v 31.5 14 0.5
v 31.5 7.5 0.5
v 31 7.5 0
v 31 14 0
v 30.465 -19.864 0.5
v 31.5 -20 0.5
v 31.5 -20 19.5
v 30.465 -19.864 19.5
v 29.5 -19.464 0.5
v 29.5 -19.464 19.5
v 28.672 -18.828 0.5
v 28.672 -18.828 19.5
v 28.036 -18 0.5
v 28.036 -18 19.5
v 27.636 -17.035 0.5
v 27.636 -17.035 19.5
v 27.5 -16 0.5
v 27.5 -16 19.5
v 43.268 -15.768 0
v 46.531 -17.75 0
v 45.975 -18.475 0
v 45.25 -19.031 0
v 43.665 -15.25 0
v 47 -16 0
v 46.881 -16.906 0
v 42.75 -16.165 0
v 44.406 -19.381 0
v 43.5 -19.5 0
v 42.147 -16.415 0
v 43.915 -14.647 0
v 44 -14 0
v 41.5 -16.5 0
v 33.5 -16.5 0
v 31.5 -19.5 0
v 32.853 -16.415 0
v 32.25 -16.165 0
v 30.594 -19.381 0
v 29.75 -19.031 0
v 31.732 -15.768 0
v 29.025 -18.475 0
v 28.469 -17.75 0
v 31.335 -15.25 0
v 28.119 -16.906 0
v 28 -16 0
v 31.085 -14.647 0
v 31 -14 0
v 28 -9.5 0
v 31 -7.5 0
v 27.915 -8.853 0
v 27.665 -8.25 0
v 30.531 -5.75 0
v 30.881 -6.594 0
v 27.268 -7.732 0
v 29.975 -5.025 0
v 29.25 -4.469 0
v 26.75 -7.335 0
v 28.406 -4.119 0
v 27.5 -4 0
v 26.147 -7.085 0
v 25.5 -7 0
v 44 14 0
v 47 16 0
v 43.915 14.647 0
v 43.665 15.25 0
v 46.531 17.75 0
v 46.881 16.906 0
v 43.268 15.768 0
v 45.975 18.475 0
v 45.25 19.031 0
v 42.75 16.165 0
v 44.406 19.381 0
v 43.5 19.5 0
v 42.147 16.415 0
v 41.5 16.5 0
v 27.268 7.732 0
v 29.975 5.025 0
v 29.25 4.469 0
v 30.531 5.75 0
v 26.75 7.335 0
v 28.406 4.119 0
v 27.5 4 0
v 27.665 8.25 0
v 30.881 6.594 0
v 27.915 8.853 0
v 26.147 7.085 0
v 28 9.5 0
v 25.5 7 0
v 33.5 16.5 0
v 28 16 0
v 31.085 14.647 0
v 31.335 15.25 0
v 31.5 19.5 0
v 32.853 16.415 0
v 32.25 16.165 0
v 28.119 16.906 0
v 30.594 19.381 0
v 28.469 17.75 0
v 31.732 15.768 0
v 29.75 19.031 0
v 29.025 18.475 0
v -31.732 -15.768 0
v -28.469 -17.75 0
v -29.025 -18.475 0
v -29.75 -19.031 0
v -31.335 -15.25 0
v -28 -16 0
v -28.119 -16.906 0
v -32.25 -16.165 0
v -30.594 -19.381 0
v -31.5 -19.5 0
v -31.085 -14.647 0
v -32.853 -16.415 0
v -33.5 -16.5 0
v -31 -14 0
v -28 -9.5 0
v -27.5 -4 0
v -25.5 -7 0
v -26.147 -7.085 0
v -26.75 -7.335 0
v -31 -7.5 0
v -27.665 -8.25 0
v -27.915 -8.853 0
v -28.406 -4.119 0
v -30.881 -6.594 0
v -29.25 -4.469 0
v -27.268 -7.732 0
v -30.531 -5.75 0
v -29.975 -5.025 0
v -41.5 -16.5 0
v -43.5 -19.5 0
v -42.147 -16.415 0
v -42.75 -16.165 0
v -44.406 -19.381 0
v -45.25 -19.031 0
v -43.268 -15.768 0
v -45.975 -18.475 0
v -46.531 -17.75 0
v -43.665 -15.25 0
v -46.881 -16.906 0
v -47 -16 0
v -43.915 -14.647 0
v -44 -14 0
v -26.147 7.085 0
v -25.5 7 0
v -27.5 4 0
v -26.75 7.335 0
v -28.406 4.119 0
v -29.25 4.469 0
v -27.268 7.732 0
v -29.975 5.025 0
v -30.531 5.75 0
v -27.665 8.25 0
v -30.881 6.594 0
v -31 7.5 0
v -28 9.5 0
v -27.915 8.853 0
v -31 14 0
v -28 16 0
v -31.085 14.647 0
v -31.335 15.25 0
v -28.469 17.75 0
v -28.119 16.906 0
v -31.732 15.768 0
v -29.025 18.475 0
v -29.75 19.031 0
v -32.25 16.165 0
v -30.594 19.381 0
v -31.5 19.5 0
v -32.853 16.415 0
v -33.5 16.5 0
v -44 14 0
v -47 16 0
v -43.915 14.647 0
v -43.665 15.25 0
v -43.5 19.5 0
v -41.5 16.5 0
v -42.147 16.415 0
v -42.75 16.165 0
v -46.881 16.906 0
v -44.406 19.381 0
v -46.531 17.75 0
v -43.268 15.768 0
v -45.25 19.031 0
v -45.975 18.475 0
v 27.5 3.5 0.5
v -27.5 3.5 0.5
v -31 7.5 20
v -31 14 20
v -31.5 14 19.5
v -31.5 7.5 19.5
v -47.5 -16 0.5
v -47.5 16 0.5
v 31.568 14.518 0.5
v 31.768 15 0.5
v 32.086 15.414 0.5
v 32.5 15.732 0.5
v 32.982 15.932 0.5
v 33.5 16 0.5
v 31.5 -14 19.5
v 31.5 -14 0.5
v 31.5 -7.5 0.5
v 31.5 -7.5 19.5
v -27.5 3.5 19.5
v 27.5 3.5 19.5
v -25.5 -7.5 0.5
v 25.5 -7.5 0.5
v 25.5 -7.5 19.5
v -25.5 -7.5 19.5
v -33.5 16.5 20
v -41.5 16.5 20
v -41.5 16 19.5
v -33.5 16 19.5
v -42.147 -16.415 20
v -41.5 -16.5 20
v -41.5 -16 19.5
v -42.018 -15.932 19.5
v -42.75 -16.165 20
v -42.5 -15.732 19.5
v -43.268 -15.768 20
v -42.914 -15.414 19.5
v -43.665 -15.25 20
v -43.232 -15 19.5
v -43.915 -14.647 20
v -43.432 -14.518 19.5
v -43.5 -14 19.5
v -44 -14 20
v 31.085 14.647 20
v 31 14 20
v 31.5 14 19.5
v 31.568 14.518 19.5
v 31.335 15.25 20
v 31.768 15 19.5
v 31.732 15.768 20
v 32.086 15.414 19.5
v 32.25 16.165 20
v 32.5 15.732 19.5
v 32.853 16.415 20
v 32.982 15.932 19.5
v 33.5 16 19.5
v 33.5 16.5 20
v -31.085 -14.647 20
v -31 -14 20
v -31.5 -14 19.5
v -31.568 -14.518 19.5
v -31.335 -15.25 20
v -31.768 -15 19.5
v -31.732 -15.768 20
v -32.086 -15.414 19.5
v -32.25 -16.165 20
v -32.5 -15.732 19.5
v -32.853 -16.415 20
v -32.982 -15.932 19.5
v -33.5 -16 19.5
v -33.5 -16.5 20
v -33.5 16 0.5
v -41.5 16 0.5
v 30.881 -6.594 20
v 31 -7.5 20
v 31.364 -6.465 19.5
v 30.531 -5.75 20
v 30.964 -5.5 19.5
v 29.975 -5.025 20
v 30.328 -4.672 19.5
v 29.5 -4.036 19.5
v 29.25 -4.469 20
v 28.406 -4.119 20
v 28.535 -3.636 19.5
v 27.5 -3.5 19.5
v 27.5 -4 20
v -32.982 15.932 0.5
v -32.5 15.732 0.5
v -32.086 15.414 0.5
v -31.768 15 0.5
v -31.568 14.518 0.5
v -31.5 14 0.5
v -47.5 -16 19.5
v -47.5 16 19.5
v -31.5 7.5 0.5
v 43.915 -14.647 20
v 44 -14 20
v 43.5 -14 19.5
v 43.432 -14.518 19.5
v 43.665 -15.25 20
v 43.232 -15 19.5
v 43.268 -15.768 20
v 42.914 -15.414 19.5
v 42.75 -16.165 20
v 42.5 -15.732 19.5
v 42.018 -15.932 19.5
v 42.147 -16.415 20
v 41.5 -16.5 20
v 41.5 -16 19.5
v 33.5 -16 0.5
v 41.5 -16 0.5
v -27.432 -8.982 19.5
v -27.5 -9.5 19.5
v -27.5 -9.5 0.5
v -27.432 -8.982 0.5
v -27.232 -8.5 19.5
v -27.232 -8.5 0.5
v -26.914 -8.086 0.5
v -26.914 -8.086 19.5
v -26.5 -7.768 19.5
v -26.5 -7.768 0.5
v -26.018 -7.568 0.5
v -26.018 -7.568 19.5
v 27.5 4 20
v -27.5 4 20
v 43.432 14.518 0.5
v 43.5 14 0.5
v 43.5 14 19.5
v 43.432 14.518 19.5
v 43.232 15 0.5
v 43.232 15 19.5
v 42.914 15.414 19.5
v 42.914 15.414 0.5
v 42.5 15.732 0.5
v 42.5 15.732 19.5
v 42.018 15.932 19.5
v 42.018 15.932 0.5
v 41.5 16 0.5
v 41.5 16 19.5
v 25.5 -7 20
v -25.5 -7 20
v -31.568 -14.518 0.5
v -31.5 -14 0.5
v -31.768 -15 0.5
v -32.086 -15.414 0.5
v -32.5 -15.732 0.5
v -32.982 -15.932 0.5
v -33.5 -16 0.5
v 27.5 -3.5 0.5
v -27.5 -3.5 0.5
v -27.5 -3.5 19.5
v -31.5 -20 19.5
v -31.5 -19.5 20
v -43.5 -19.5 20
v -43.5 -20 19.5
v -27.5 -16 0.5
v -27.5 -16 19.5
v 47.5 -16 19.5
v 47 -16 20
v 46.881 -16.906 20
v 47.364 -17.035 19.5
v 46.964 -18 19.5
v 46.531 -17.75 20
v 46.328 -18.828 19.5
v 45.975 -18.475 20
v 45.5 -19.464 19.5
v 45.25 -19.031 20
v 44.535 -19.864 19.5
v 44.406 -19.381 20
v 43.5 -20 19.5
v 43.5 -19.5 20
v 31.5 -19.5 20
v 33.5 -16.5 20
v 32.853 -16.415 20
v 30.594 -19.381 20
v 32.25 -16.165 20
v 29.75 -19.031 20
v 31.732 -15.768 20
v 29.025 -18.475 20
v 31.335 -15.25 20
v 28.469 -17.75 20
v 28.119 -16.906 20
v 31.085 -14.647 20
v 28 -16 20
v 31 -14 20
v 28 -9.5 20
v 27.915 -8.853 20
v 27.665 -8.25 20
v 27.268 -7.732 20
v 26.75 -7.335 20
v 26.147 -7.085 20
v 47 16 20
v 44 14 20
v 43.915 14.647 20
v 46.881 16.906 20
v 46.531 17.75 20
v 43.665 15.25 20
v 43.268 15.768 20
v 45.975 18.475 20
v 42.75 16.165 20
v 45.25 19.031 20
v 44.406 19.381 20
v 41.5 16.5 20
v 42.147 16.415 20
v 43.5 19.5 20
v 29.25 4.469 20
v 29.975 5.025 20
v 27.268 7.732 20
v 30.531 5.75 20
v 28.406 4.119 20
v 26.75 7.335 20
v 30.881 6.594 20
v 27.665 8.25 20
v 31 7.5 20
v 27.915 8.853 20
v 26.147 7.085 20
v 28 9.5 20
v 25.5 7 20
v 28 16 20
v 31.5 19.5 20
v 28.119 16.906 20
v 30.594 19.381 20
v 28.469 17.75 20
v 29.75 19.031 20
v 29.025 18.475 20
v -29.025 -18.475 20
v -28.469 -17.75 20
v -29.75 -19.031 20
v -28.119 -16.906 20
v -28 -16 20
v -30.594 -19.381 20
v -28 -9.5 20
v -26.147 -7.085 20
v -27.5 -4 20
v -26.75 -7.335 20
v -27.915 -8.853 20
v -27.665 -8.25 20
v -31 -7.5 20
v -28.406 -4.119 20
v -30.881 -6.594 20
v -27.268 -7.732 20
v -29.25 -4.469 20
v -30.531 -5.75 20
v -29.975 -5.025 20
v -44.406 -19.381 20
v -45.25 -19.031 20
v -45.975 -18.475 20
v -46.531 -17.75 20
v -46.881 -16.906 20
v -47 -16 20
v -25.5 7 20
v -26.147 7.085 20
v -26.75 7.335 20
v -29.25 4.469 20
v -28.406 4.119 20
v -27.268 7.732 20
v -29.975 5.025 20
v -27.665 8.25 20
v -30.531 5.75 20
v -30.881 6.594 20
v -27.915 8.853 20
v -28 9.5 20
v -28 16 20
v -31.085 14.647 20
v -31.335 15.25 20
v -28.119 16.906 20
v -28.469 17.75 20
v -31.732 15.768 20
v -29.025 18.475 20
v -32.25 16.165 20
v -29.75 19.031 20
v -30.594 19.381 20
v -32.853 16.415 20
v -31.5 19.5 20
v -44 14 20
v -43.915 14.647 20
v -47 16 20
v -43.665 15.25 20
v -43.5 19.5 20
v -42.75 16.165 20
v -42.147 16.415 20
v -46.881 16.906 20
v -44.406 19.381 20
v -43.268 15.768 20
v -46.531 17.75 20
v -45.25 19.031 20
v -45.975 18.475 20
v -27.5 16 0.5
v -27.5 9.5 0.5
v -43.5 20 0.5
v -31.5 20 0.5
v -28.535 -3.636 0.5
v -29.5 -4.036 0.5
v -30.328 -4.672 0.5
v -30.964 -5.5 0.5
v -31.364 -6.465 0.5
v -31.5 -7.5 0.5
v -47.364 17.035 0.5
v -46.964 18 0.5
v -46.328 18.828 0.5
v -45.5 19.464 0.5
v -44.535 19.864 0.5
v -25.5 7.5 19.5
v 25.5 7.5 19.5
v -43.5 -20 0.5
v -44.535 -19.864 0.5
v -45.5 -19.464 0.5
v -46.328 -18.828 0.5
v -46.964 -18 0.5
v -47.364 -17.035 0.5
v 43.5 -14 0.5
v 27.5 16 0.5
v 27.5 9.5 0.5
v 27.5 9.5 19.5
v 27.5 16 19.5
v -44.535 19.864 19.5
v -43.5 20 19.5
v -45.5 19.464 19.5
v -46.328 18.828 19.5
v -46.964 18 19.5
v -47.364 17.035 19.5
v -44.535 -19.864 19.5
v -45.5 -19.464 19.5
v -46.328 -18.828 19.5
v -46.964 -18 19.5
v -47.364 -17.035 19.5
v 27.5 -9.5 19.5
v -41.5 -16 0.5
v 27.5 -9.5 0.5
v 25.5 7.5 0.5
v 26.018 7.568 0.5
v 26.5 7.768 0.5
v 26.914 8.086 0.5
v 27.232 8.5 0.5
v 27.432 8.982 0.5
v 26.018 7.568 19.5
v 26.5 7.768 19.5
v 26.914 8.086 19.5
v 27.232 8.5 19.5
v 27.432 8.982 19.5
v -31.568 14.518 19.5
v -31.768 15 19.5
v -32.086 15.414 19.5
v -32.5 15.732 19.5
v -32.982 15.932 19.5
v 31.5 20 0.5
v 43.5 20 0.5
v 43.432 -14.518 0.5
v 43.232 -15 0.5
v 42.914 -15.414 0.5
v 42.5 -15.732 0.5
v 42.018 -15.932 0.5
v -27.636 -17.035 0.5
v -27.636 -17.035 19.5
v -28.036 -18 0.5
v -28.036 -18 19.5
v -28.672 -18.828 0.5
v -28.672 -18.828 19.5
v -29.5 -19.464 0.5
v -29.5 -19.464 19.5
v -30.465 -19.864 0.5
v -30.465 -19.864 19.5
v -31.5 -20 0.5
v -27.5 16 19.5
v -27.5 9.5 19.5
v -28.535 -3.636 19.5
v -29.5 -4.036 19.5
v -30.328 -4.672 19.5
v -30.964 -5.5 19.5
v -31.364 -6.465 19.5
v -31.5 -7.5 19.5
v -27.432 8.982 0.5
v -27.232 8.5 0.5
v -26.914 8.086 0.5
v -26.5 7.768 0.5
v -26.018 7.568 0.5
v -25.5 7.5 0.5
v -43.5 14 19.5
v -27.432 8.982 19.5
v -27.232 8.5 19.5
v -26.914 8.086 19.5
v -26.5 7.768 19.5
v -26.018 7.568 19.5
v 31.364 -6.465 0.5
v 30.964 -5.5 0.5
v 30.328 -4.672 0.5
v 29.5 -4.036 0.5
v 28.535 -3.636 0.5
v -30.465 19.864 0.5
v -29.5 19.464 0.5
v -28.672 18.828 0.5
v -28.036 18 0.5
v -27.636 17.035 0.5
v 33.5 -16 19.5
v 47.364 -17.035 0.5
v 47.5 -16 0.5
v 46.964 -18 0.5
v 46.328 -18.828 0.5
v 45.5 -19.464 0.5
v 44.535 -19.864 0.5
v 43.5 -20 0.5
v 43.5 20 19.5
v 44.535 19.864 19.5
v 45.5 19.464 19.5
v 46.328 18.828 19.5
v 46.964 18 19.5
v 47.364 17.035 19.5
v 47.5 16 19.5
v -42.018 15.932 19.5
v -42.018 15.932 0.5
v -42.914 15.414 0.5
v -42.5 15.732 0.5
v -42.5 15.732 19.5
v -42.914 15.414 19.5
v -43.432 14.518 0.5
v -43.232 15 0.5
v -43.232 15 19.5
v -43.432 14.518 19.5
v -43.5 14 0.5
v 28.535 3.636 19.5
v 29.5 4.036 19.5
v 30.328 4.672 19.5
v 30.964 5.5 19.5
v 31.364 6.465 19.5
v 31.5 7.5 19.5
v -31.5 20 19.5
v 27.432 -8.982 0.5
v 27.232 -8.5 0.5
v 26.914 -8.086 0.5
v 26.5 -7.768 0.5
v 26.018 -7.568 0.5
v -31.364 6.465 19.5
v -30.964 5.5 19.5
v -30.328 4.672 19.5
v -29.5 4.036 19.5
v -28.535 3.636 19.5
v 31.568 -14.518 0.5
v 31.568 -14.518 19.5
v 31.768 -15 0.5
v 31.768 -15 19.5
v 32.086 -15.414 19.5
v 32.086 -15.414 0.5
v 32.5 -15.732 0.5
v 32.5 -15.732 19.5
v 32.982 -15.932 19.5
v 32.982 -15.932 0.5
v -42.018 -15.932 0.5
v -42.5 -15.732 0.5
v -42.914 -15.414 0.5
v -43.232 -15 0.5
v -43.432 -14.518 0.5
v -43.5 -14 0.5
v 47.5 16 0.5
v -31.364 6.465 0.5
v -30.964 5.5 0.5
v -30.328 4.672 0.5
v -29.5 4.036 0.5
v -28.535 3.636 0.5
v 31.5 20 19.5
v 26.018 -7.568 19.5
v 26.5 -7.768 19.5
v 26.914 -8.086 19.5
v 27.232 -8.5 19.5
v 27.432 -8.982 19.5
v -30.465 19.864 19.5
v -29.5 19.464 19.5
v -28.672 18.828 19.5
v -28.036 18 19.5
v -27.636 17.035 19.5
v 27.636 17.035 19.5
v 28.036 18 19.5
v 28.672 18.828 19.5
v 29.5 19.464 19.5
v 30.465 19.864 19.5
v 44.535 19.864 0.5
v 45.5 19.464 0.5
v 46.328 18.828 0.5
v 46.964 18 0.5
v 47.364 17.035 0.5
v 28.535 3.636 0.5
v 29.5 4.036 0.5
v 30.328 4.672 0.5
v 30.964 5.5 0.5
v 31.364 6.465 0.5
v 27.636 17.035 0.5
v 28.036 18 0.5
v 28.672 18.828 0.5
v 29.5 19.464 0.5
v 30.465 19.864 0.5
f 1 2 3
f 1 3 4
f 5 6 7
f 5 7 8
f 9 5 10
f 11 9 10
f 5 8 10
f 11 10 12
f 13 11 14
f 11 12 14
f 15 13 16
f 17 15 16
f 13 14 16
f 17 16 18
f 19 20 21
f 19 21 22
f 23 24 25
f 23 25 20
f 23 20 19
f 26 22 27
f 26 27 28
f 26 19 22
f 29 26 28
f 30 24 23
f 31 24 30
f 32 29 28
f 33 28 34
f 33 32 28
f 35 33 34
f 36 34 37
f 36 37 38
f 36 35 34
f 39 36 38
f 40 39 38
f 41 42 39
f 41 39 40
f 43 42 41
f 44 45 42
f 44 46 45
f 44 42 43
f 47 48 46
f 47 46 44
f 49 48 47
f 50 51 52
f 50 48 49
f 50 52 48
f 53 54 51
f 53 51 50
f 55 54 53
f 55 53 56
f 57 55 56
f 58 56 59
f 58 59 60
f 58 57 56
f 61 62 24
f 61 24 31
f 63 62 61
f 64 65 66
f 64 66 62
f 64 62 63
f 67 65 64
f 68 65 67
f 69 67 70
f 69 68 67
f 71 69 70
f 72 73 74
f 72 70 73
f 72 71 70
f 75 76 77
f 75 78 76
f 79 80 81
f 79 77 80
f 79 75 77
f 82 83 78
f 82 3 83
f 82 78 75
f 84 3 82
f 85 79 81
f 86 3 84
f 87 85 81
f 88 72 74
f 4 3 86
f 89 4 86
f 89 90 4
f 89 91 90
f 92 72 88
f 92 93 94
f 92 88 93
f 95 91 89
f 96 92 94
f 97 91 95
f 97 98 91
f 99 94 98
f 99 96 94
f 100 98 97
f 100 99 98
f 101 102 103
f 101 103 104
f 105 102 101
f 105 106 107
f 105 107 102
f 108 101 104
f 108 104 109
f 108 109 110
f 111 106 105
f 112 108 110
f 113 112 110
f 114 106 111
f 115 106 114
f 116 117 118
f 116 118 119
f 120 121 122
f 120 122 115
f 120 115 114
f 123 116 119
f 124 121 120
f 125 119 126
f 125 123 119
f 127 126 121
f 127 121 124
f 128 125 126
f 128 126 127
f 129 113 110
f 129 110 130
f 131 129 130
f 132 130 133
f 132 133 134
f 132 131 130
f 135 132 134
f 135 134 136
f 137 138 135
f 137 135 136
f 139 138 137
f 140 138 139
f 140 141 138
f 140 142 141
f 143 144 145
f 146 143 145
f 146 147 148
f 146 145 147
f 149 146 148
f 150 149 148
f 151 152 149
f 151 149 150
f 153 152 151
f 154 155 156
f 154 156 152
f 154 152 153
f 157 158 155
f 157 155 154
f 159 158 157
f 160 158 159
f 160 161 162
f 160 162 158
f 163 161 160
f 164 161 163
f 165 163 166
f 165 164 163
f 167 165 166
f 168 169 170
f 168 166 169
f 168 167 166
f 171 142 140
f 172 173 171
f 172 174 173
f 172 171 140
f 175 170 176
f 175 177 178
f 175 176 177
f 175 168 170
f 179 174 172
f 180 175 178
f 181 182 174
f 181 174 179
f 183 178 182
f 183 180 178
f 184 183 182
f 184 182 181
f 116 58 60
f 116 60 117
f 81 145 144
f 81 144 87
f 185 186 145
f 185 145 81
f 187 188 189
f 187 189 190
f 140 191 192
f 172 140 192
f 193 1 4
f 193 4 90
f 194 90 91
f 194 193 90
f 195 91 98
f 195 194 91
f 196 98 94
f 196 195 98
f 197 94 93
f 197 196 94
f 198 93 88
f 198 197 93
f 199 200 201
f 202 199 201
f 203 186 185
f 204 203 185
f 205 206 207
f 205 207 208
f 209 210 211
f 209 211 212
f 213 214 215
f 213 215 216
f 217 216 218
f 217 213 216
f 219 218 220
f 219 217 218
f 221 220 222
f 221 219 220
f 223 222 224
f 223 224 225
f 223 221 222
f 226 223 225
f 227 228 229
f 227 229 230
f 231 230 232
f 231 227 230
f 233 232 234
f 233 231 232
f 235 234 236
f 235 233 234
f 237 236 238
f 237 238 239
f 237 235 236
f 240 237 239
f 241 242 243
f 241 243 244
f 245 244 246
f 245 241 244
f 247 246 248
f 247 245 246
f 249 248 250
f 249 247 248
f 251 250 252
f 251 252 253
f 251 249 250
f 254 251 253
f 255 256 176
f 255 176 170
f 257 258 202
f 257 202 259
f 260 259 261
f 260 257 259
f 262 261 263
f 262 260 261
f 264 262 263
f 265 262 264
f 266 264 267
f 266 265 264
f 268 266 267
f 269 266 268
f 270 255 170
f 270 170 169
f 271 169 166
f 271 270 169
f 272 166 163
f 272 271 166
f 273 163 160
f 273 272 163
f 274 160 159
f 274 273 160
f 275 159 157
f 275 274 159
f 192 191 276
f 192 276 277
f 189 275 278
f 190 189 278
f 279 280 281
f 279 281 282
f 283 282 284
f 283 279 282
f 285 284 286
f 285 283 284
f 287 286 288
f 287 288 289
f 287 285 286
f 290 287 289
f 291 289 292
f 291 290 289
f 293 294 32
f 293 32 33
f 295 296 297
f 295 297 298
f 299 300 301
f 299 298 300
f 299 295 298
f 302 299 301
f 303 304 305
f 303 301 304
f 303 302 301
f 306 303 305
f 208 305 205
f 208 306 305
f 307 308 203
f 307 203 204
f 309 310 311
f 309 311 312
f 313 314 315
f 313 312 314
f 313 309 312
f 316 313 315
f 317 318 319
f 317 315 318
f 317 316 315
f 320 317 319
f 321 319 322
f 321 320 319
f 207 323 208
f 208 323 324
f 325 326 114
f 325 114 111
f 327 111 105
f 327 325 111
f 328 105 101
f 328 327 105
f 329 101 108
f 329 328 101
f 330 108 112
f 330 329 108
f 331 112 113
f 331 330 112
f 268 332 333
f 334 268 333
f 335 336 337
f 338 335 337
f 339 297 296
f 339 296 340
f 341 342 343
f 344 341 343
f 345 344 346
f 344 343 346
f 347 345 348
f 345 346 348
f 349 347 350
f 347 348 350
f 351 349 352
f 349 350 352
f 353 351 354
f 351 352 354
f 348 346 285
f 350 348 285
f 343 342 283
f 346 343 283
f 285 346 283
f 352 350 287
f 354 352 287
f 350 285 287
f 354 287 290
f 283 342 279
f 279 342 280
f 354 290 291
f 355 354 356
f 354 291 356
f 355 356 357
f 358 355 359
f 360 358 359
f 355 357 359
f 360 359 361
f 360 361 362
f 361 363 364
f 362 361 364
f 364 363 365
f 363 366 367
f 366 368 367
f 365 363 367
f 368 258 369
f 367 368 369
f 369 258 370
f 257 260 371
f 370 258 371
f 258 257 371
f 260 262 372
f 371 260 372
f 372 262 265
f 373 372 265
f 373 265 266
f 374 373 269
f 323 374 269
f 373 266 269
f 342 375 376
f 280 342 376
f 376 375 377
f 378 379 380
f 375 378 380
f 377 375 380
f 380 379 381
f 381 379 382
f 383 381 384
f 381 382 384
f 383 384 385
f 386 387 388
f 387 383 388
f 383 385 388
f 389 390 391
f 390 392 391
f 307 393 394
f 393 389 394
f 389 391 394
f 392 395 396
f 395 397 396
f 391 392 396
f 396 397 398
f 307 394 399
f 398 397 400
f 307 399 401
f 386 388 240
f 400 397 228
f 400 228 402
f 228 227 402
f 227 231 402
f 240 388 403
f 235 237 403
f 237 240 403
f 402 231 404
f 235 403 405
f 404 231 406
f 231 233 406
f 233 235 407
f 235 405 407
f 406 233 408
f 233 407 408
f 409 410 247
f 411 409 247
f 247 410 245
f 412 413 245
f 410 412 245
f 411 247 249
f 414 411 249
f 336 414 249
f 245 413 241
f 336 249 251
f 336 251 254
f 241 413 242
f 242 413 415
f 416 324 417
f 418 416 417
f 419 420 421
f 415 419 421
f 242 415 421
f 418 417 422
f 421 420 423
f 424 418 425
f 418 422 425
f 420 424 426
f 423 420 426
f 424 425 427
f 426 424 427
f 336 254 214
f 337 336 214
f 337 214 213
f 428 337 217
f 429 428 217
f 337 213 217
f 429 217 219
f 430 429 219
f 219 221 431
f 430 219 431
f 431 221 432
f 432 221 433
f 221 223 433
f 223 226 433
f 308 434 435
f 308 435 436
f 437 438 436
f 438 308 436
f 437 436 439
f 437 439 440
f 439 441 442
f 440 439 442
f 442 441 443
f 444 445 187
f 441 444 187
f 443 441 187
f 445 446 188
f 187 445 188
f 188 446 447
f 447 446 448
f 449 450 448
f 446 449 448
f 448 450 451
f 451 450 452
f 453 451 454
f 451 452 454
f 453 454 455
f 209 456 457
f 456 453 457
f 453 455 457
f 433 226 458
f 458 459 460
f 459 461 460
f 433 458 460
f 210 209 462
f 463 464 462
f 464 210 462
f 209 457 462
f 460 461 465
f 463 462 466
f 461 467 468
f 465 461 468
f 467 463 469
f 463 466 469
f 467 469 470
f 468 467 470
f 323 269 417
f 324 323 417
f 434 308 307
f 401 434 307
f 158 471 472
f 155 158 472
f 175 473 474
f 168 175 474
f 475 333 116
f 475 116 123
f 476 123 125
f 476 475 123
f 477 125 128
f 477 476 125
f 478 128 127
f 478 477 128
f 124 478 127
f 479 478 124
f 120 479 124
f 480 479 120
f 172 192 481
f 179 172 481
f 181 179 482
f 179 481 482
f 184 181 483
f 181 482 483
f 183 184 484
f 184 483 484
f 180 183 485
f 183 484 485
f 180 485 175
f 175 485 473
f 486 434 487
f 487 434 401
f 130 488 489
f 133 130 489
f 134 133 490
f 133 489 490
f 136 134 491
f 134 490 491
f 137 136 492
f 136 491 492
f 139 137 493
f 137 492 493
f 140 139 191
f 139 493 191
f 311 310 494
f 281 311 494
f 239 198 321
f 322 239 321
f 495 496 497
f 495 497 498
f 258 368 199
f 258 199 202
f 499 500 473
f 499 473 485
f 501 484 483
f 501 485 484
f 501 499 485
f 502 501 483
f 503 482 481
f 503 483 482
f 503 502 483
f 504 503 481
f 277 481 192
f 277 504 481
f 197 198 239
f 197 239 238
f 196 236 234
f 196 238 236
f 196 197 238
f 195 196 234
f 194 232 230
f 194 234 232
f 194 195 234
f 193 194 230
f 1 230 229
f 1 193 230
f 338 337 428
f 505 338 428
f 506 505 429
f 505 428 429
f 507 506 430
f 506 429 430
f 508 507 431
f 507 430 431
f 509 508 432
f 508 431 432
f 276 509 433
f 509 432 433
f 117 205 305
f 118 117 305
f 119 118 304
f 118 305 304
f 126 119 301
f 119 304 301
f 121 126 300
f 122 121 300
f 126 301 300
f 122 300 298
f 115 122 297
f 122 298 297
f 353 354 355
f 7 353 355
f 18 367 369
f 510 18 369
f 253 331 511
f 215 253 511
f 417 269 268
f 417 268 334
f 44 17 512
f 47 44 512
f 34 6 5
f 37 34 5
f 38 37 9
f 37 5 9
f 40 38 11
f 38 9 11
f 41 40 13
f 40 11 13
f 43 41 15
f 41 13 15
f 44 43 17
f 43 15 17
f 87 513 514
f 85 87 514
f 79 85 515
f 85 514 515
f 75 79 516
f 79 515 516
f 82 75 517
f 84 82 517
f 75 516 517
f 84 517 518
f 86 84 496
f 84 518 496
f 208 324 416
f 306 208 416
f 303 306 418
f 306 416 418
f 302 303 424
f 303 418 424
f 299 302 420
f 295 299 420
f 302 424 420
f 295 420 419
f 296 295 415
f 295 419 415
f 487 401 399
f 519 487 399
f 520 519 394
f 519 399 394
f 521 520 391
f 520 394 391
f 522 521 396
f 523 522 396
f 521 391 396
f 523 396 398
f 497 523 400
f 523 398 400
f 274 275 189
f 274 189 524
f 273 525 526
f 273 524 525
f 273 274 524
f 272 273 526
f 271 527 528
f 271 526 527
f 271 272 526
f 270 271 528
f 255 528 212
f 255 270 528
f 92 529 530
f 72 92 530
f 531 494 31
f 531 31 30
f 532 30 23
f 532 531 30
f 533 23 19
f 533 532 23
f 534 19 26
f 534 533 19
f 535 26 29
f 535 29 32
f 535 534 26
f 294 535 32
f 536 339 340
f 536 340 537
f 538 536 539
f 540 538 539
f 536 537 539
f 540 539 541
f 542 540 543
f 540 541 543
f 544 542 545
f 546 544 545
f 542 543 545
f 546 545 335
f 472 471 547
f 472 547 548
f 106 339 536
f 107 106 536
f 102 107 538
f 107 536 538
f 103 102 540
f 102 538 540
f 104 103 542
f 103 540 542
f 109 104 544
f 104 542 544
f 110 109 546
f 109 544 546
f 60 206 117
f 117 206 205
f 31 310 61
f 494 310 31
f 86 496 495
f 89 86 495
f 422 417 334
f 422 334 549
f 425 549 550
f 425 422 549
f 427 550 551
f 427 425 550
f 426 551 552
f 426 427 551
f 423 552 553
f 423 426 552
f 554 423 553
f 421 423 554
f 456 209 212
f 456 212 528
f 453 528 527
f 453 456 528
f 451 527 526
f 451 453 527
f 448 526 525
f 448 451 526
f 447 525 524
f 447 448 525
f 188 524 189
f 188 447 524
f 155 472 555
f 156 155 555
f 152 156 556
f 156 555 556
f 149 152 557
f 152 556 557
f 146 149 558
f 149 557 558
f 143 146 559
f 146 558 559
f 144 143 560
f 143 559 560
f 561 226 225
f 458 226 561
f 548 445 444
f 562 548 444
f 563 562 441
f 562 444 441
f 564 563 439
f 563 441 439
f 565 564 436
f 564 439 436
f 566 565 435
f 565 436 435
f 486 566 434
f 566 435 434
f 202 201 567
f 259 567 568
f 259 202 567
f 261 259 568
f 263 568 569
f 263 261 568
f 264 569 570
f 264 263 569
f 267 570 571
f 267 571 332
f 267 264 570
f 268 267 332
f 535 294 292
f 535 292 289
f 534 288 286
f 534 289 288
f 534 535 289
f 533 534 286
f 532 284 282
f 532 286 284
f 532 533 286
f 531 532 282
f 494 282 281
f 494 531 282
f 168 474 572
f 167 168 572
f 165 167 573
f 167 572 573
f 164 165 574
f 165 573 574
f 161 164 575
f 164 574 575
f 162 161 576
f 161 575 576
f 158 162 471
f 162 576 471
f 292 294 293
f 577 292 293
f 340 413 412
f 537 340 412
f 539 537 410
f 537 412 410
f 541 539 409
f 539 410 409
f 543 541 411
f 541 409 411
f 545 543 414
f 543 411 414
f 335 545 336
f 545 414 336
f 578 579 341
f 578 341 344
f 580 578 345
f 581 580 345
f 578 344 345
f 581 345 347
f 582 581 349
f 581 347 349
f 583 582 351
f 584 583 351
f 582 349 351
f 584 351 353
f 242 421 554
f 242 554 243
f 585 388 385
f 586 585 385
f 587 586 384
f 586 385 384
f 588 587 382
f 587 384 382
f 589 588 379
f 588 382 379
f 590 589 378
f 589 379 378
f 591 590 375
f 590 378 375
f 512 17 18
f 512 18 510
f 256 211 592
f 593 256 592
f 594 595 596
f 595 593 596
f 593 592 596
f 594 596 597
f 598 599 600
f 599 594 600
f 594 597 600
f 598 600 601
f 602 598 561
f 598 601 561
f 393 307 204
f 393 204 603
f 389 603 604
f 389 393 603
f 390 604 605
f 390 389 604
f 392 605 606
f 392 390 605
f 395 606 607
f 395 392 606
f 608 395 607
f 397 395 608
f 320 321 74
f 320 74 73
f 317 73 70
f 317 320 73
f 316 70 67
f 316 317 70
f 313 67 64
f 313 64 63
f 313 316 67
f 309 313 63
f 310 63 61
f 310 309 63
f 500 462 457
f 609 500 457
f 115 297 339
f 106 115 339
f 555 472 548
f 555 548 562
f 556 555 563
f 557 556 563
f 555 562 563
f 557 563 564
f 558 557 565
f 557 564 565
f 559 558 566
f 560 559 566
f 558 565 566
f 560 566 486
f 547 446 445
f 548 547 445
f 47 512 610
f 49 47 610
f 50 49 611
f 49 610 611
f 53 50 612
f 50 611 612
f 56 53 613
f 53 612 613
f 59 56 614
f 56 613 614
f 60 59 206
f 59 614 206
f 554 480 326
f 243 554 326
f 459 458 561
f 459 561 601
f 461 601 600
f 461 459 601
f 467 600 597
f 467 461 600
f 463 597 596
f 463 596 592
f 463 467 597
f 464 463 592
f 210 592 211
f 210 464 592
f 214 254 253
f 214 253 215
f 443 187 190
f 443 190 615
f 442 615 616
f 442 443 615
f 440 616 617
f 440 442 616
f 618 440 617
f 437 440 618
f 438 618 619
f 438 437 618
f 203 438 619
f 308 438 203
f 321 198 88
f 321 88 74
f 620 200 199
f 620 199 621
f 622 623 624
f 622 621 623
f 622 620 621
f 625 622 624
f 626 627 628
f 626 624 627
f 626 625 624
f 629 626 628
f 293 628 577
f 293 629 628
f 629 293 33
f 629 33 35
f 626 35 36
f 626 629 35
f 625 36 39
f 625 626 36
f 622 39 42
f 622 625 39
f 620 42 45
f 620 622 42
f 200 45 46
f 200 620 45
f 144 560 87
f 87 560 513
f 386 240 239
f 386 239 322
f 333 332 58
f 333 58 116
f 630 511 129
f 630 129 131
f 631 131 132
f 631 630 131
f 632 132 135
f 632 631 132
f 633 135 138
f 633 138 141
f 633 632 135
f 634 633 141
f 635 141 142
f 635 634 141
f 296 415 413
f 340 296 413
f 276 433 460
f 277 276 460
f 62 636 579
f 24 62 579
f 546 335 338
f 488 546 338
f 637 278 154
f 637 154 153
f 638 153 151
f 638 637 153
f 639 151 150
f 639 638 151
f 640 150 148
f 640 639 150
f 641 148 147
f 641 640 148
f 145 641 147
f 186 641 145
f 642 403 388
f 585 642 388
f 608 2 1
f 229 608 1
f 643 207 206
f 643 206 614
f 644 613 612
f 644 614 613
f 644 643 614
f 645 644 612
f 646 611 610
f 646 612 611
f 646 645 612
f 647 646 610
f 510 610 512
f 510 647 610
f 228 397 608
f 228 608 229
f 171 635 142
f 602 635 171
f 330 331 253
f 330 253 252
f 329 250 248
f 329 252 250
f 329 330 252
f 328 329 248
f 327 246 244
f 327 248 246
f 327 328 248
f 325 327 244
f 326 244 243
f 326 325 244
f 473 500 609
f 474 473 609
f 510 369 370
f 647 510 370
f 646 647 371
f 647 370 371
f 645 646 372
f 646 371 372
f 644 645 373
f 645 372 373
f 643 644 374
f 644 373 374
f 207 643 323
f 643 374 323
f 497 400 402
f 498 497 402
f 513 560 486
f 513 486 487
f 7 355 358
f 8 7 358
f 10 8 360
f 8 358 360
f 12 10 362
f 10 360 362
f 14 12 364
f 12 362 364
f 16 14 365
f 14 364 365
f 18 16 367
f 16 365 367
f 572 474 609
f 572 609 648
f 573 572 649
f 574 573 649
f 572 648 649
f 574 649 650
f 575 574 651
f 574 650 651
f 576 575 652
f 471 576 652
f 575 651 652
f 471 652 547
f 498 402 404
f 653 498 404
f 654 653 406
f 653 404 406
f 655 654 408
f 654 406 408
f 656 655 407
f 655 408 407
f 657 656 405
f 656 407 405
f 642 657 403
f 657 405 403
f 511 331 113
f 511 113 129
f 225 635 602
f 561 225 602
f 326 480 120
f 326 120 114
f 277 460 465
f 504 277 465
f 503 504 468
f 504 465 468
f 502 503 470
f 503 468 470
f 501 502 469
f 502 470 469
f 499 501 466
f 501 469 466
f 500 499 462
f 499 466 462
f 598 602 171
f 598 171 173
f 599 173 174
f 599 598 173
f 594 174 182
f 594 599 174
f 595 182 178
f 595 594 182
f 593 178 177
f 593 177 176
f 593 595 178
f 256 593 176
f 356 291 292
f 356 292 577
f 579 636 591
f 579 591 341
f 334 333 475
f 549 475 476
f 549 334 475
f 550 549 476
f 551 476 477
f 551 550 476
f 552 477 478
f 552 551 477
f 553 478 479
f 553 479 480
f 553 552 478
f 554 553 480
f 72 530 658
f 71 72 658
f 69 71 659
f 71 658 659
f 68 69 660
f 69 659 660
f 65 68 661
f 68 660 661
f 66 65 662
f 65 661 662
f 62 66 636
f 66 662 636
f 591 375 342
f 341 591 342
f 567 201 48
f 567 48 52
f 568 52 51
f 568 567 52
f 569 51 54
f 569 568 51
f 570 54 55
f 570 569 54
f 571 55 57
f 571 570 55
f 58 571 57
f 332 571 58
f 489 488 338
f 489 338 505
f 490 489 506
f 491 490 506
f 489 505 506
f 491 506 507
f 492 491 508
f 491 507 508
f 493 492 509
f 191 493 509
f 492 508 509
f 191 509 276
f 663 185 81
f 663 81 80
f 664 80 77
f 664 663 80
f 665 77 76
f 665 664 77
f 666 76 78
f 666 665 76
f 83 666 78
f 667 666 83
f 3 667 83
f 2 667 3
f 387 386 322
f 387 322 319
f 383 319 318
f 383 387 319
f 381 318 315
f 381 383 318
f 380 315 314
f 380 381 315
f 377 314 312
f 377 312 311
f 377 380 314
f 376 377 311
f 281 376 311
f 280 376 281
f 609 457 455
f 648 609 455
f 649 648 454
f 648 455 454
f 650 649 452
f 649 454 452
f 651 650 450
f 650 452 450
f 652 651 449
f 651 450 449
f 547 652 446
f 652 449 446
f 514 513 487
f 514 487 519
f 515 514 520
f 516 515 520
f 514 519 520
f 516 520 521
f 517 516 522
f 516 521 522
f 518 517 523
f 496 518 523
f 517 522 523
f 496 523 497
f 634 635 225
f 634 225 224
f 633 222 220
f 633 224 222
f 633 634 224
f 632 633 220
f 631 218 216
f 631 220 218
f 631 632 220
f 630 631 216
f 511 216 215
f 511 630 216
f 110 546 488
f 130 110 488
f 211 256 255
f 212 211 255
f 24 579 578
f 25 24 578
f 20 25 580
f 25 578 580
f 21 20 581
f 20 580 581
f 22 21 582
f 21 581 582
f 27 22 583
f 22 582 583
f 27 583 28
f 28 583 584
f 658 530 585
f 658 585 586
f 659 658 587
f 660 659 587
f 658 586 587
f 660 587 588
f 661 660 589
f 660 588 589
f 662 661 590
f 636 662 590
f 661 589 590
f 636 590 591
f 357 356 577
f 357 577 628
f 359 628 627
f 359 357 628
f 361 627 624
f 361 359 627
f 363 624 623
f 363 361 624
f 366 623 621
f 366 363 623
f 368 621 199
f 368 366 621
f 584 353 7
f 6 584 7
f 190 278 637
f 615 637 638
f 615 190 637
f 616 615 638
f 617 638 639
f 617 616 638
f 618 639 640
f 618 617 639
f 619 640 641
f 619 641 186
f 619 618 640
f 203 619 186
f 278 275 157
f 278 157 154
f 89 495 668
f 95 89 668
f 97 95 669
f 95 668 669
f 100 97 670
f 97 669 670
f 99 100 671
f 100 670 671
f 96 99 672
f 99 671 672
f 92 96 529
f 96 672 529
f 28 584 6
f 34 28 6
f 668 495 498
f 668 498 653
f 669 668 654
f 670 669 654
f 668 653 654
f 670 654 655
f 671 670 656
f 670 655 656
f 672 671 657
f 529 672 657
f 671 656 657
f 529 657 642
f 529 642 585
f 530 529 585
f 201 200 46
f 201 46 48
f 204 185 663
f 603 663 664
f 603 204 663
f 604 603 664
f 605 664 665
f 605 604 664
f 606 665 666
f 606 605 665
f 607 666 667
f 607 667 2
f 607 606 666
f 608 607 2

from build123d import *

# Parameters (mm, degrees)
PAD_DEPTH    = 20
THICKNESS_T  = -4
FILLET_R     = 4
FILLET001_R  = 2
CHAMFER_SIZE = 0.5


with BuildPart() as part:
    # Sketch → Pad (new body)
    with BuildSketch(Plane.XY):
        Polygon((-47.5, 20), (-27.5, 20), (-27.5, 7.5), (27.5, 7.5), (27.5, 20), (47.5, 20), (47.5, -20), (27.5, -20), (27.5, -7.5), (-27.5, -7.5), (-27.5, -20), (-47.5, -20), align=None)
    extrude(amount=PAD_DEPTH)

    # Thickness
    thickness_openings = [part.faces().sort_by_distance(p)[0] for p in [
        (0, 0, 0),
        (0, 0, 20),
    ]]
    offset(amount=THICKNESS_T, openings=thickness_openings)

    # Fillet
    fillet_edges = [part.edges().sort_by_distance(p)[0] for p in [
        (-47.5, -20, 10),
        (-27.5, -20, 10),
        (27.5, -20, 10),
        (47.5, -20, 10),
        (47.5, 20, 10),
        (27.5, 20, 10),
        (-27.5, 20, 10),
        (-47.5, 20, 10),
    ]]
    fillet(fillet_edges, radius=FILLET_R)

    # Fillet001
    fillet001_edges = [part.edges().sort_by_distance(p)[0] for p in [
        (-27.5, -7.5, 10),
        (-27.5, 7.5, 10),
        (27.5, 7.5, 10),
        (27.5, -7.5, 10),
        (-43.5, 16, 10),
        (-31.5, 16, 10),
        (-31.5, -16, 10),
        (-43.5, -16, 10),
        (31.5, 16, 10),
        (43.5, 16, 10),
        (31.5, -16, 10),
        (43.5, -16, 10),
    ]]
    fillet(fillet001_edges, radius=FILLET001_R)

    # Chamfer
    chamfer_edges = [part.edges().sort_by_distance(p)[0] for p in [
        (-27.5, 12.75, 20),
        (-26.914214, 8.085786, 20),
        (-28.671573, 18.828427, 20),
        (0, 7.5, 20),
        (-37.5, 20, 20),
        (26.914214, 8.085786, 20),
        (-46.328427, 18.828427, 20),
        (27.5, 12.75, 20),
        (-47.5, 0, 20),
        (28.671573, 18.828427, 20),
        (-46.328427, -18.828427, 20),
        (37.5, 20, 20),
        (-37.5, -20, 20),
        (46.328427, 18.828427, 20),
        (-28.671573, -18.828427, 20),
        (47.5, 0, 20),
        (-27.5, -12.75, 20),
        (46.328427, -18.828427, 20),
        (-26.914214, -8.085786, 20),
        (37.5, -20, 20),
        (0, -7.5, 20),
        (28.671573, -18.828427, 20),
        (26.914214, -8.085786, 20),
        (27.5, -12.75, 20),
        (-37.5, -16, 20),
        (-32.085786, -15.414214, 20),
        (-42.914214, -15.414214, 20),
        (-31.5, -10.75, 20),
        (-43.5, 0, 20),
        (-30.328427, -4.671573, 20),
        (-42.914214, 15.414214, 20),
        (0, -3.5, 20),
        (-37.5, 16, 20),
        (30.328427, -4.671573, 20),
        (-32.085786, 15.414214, 20),
        (31.5, -10.75, 20),
        (-31.5, 10.75, 20),
        (32.085786, -15.414214, 20),
        (-30.328427, 4.671573, 20),
        (37.5, -16, 20),
        (0, 3.5, 20),
        (42.914214, -15.414214, 20),
        (30.328427, 4.671573, 20),
        (43.5, 0, 20),
        (31.5, 10.75, 20),
        (42.914214, 15.414214, 20),
        (32.085786, 15.414214, 20),
        (37.5, 16, 20),
        (-27.5, 12.75, 0),
        (-26.914214, 8.085786, 0),
        (-28.671573, 18.828427, 0),
        (0, 7.5, 0),
        (-37.5, 20, 0),
        (26.914214, 8.085786, 0),
        (-46.328427, 18.828427, 0),
        (27.5, 12.75, 0),
        (-47.5, 0, 0),
        (28.671573, 18.828427, 0),
        (-46.328427, -18.828427, 0),
        (37.5, 20, 0),
        (-37.5, -20, 0),
        (46.328427, 18.828427, 0),
        (-28.671573, -18.828427, 0),
        (47.5, 0, 0),
        (-27.5, -12.75, 0),
        (46.328427, -18.828427, 0),
        (-26.914214, -8.085786, 0),
        (37.5, -20, 0),
        (0, -7.5, 0),
        (28.671573, -18.828427, 0),
        (26.914214, -8.085786, 0),
        (27.5, -12.75, 0),
        (-37.5, -16, 0),
        (-32.085786, -15.414214, 0),
        (-42.914214, -15.414214, 0),
        (-31.5, -10.75, 0),
        (-43.5, 0, 0),
        (-30.328427, -4.671573, 0),
        (-42.914214, 15.414214, 0),
        (0, -3.5, 0),
        (-37.5, 16, 0),
        (30.328427, -4.671573, 0),
        (-32.085786, 15.414214, 0),
        (31.5, -10.75, 0),
        (-31.5, 10.75, 0),
        (32.085786, -15.414214, 0),
        (-30.328427, 4.671573, 0),
        (37.5, -16, 0),
        (0, 3.5, 0),
        (42.914214, -15.414214, 0),
        (30.328427, 4.671573, 0),
        (43.5, 0, 0),
        (31.5, 10.75, 0),
        (42.914214, 15.414214, 0),
        (32.085786, 15.414214, 0),
        (37.5, 16, 0),
    ]]
    chamfer(chamfer_edges, length=CHAMFER_SIZE)


solid = part.part
